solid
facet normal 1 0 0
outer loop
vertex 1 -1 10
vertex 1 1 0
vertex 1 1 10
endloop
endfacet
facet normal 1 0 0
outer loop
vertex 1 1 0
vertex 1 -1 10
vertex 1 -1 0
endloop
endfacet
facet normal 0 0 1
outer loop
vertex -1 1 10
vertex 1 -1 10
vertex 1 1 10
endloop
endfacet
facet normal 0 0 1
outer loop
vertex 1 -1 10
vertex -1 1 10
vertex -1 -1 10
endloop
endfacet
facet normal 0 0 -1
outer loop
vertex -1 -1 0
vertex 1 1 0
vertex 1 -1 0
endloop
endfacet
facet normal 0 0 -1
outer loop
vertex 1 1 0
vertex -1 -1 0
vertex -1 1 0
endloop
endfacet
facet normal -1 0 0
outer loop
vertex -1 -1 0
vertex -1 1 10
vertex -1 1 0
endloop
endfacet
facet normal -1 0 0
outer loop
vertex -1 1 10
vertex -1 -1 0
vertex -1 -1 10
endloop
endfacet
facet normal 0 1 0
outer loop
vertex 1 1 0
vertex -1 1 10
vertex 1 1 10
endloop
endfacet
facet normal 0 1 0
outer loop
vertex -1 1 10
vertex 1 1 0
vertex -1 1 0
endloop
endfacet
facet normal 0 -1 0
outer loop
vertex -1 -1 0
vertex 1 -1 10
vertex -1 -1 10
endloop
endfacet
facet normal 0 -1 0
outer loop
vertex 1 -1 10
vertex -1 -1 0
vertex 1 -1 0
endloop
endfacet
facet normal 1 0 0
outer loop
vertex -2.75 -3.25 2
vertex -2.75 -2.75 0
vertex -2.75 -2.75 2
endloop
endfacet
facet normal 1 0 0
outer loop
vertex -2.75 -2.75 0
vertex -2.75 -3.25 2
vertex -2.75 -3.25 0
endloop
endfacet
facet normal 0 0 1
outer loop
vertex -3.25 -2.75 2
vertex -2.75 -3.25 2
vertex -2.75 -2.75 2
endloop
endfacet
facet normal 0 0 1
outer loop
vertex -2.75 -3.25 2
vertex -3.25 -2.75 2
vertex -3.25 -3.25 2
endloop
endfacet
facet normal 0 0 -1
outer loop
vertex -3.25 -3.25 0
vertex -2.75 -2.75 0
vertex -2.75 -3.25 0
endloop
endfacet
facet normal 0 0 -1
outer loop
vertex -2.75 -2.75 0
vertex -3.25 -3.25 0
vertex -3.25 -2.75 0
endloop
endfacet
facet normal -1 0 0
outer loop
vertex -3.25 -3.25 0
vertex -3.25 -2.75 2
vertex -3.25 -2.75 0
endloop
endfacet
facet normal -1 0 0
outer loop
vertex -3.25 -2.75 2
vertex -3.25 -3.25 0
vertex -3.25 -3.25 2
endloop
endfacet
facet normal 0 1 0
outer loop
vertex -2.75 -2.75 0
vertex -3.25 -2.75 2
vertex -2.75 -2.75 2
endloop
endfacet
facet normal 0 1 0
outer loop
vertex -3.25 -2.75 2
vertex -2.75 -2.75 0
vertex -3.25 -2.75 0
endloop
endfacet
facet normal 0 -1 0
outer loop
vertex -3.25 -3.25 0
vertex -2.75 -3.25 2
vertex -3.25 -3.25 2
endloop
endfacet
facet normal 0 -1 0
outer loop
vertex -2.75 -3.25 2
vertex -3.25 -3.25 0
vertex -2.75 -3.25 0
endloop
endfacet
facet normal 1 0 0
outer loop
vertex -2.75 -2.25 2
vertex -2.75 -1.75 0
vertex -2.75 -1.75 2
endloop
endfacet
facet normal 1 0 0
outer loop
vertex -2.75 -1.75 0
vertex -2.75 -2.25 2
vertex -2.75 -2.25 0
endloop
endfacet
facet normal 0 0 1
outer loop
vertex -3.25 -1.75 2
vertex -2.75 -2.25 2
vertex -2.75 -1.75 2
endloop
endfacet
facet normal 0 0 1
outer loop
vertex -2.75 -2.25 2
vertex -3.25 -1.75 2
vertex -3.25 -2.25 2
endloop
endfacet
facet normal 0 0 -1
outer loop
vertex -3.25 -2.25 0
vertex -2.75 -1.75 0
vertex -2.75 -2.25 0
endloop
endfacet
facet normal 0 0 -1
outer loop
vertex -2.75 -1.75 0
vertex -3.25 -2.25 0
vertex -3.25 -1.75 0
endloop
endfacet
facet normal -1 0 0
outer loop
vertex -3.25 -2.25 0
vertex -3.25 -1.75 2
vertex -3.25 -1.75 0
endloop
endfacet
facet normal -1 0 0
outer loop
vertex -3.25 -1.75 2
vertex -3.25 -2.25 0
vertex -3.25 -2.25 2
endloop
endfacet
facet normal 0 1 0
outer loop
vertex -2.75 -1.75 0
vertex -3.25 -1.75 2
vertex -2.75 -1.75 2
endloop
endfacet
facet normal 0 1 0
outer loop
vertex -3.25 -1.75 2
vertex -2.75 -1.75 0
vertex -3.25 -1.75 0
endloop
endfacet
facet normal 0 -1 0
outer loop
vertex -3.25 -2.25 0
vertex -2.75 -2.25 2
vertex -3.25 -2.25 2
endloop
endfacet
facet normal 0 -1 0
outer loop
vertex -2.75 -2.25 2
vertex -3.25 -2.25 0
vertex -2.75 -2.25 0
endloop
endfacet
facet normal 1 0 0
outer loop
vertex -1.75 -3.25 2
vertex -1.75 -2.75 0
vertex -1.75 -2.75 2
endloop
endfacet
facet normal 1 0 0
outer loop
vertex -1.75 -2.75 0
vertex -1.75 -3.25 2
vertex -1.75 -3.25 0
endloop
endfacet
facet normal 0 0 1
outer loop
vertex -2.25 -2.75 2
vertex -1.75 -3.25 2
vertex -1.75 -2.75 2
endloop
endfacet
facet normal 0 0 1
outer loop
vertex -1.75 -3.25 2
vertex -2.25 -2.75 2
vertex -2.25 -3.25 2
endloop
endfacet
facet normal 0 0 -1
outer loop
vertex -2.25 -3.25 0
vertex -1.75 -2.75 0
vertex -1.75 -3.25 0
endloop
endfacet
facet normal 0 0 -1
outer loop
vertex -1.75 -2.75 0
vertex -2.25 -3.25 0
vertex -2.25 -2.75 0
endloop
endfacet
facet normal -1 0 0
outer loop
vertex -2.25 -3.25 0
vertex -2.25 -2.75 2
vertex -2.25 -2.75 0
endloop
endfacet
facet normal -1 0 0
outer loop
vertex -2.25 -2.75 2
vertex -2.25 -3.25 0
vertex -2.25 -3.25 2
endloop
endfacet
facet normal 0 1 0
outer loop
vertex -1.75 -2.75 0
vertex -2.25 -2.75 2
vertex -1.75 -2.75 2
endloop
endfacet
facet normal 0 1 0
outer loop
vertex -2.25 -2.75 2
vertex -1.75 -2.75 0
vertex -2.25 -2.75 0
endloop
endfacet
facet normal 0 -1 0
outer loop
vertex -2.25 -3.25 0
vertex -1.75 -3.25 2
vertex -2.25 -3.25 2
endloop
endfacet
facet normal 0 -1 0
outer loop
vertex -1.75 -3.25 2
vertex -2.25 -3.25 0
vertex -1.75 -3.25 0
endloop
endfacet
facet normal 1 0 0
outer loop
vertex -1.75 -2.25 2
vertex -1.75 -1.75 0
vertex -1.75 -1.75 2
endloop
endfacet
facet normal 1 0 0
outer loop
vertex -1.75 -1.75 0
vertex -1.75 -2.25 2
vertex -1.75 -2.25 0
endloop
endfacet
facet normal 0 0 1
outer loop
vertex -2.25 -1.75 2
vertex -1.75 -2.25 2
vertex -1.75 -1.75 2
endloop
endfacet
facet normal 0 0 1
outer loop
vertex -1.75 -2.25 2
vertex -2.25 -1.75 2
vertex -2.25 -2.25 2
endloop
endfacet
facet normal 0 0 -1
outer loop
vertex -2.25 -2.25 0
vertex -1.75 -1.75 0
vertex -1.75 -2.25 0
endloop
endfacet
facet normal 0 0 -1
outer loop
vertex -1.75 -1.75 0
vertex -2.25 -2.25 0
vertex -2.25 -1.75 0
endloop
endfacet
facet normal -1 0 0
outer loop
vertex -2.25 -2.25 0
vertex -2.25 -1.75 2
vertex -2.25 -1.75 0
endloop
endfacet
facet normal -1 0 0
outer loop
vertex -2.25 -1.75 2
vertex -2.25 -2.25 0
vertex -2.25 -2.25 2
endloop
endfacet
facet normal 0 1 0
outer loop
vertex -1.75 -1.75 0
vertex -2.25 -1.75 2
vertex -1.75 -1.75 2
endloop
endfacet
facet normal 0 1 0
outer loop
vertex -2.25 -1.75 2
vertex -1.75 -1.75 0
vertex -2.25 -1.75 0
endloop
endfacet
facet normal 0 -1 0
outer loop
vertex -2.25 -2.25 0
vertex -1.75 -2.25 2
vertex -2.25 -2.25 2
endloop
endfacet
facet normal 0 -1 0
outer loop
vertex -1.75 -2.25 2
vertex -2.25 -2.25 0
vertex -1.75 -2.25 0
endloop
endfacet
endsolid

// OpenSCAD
translate([0, 0, 5]) color([0,1,0,0.9]) cube([2, 2, 10], center=true);
translate([-3.0, -3.0, 1]) color([1,0,0]) cube([0.5, 0.5, 2], center=true);
translate([-3.0, -2.0, 1]) color([1,0,0]) cube([0.5, 0.5, 2], center=true);
translate([-2.0, -3.0, 1]) color([1,0,0]) cube([0.5, 0.5, 2], center=true);
translate([-2.0, -2.0, 1]) color([1,0,0]) cube([0.5, 0.5, 2], center=true);
